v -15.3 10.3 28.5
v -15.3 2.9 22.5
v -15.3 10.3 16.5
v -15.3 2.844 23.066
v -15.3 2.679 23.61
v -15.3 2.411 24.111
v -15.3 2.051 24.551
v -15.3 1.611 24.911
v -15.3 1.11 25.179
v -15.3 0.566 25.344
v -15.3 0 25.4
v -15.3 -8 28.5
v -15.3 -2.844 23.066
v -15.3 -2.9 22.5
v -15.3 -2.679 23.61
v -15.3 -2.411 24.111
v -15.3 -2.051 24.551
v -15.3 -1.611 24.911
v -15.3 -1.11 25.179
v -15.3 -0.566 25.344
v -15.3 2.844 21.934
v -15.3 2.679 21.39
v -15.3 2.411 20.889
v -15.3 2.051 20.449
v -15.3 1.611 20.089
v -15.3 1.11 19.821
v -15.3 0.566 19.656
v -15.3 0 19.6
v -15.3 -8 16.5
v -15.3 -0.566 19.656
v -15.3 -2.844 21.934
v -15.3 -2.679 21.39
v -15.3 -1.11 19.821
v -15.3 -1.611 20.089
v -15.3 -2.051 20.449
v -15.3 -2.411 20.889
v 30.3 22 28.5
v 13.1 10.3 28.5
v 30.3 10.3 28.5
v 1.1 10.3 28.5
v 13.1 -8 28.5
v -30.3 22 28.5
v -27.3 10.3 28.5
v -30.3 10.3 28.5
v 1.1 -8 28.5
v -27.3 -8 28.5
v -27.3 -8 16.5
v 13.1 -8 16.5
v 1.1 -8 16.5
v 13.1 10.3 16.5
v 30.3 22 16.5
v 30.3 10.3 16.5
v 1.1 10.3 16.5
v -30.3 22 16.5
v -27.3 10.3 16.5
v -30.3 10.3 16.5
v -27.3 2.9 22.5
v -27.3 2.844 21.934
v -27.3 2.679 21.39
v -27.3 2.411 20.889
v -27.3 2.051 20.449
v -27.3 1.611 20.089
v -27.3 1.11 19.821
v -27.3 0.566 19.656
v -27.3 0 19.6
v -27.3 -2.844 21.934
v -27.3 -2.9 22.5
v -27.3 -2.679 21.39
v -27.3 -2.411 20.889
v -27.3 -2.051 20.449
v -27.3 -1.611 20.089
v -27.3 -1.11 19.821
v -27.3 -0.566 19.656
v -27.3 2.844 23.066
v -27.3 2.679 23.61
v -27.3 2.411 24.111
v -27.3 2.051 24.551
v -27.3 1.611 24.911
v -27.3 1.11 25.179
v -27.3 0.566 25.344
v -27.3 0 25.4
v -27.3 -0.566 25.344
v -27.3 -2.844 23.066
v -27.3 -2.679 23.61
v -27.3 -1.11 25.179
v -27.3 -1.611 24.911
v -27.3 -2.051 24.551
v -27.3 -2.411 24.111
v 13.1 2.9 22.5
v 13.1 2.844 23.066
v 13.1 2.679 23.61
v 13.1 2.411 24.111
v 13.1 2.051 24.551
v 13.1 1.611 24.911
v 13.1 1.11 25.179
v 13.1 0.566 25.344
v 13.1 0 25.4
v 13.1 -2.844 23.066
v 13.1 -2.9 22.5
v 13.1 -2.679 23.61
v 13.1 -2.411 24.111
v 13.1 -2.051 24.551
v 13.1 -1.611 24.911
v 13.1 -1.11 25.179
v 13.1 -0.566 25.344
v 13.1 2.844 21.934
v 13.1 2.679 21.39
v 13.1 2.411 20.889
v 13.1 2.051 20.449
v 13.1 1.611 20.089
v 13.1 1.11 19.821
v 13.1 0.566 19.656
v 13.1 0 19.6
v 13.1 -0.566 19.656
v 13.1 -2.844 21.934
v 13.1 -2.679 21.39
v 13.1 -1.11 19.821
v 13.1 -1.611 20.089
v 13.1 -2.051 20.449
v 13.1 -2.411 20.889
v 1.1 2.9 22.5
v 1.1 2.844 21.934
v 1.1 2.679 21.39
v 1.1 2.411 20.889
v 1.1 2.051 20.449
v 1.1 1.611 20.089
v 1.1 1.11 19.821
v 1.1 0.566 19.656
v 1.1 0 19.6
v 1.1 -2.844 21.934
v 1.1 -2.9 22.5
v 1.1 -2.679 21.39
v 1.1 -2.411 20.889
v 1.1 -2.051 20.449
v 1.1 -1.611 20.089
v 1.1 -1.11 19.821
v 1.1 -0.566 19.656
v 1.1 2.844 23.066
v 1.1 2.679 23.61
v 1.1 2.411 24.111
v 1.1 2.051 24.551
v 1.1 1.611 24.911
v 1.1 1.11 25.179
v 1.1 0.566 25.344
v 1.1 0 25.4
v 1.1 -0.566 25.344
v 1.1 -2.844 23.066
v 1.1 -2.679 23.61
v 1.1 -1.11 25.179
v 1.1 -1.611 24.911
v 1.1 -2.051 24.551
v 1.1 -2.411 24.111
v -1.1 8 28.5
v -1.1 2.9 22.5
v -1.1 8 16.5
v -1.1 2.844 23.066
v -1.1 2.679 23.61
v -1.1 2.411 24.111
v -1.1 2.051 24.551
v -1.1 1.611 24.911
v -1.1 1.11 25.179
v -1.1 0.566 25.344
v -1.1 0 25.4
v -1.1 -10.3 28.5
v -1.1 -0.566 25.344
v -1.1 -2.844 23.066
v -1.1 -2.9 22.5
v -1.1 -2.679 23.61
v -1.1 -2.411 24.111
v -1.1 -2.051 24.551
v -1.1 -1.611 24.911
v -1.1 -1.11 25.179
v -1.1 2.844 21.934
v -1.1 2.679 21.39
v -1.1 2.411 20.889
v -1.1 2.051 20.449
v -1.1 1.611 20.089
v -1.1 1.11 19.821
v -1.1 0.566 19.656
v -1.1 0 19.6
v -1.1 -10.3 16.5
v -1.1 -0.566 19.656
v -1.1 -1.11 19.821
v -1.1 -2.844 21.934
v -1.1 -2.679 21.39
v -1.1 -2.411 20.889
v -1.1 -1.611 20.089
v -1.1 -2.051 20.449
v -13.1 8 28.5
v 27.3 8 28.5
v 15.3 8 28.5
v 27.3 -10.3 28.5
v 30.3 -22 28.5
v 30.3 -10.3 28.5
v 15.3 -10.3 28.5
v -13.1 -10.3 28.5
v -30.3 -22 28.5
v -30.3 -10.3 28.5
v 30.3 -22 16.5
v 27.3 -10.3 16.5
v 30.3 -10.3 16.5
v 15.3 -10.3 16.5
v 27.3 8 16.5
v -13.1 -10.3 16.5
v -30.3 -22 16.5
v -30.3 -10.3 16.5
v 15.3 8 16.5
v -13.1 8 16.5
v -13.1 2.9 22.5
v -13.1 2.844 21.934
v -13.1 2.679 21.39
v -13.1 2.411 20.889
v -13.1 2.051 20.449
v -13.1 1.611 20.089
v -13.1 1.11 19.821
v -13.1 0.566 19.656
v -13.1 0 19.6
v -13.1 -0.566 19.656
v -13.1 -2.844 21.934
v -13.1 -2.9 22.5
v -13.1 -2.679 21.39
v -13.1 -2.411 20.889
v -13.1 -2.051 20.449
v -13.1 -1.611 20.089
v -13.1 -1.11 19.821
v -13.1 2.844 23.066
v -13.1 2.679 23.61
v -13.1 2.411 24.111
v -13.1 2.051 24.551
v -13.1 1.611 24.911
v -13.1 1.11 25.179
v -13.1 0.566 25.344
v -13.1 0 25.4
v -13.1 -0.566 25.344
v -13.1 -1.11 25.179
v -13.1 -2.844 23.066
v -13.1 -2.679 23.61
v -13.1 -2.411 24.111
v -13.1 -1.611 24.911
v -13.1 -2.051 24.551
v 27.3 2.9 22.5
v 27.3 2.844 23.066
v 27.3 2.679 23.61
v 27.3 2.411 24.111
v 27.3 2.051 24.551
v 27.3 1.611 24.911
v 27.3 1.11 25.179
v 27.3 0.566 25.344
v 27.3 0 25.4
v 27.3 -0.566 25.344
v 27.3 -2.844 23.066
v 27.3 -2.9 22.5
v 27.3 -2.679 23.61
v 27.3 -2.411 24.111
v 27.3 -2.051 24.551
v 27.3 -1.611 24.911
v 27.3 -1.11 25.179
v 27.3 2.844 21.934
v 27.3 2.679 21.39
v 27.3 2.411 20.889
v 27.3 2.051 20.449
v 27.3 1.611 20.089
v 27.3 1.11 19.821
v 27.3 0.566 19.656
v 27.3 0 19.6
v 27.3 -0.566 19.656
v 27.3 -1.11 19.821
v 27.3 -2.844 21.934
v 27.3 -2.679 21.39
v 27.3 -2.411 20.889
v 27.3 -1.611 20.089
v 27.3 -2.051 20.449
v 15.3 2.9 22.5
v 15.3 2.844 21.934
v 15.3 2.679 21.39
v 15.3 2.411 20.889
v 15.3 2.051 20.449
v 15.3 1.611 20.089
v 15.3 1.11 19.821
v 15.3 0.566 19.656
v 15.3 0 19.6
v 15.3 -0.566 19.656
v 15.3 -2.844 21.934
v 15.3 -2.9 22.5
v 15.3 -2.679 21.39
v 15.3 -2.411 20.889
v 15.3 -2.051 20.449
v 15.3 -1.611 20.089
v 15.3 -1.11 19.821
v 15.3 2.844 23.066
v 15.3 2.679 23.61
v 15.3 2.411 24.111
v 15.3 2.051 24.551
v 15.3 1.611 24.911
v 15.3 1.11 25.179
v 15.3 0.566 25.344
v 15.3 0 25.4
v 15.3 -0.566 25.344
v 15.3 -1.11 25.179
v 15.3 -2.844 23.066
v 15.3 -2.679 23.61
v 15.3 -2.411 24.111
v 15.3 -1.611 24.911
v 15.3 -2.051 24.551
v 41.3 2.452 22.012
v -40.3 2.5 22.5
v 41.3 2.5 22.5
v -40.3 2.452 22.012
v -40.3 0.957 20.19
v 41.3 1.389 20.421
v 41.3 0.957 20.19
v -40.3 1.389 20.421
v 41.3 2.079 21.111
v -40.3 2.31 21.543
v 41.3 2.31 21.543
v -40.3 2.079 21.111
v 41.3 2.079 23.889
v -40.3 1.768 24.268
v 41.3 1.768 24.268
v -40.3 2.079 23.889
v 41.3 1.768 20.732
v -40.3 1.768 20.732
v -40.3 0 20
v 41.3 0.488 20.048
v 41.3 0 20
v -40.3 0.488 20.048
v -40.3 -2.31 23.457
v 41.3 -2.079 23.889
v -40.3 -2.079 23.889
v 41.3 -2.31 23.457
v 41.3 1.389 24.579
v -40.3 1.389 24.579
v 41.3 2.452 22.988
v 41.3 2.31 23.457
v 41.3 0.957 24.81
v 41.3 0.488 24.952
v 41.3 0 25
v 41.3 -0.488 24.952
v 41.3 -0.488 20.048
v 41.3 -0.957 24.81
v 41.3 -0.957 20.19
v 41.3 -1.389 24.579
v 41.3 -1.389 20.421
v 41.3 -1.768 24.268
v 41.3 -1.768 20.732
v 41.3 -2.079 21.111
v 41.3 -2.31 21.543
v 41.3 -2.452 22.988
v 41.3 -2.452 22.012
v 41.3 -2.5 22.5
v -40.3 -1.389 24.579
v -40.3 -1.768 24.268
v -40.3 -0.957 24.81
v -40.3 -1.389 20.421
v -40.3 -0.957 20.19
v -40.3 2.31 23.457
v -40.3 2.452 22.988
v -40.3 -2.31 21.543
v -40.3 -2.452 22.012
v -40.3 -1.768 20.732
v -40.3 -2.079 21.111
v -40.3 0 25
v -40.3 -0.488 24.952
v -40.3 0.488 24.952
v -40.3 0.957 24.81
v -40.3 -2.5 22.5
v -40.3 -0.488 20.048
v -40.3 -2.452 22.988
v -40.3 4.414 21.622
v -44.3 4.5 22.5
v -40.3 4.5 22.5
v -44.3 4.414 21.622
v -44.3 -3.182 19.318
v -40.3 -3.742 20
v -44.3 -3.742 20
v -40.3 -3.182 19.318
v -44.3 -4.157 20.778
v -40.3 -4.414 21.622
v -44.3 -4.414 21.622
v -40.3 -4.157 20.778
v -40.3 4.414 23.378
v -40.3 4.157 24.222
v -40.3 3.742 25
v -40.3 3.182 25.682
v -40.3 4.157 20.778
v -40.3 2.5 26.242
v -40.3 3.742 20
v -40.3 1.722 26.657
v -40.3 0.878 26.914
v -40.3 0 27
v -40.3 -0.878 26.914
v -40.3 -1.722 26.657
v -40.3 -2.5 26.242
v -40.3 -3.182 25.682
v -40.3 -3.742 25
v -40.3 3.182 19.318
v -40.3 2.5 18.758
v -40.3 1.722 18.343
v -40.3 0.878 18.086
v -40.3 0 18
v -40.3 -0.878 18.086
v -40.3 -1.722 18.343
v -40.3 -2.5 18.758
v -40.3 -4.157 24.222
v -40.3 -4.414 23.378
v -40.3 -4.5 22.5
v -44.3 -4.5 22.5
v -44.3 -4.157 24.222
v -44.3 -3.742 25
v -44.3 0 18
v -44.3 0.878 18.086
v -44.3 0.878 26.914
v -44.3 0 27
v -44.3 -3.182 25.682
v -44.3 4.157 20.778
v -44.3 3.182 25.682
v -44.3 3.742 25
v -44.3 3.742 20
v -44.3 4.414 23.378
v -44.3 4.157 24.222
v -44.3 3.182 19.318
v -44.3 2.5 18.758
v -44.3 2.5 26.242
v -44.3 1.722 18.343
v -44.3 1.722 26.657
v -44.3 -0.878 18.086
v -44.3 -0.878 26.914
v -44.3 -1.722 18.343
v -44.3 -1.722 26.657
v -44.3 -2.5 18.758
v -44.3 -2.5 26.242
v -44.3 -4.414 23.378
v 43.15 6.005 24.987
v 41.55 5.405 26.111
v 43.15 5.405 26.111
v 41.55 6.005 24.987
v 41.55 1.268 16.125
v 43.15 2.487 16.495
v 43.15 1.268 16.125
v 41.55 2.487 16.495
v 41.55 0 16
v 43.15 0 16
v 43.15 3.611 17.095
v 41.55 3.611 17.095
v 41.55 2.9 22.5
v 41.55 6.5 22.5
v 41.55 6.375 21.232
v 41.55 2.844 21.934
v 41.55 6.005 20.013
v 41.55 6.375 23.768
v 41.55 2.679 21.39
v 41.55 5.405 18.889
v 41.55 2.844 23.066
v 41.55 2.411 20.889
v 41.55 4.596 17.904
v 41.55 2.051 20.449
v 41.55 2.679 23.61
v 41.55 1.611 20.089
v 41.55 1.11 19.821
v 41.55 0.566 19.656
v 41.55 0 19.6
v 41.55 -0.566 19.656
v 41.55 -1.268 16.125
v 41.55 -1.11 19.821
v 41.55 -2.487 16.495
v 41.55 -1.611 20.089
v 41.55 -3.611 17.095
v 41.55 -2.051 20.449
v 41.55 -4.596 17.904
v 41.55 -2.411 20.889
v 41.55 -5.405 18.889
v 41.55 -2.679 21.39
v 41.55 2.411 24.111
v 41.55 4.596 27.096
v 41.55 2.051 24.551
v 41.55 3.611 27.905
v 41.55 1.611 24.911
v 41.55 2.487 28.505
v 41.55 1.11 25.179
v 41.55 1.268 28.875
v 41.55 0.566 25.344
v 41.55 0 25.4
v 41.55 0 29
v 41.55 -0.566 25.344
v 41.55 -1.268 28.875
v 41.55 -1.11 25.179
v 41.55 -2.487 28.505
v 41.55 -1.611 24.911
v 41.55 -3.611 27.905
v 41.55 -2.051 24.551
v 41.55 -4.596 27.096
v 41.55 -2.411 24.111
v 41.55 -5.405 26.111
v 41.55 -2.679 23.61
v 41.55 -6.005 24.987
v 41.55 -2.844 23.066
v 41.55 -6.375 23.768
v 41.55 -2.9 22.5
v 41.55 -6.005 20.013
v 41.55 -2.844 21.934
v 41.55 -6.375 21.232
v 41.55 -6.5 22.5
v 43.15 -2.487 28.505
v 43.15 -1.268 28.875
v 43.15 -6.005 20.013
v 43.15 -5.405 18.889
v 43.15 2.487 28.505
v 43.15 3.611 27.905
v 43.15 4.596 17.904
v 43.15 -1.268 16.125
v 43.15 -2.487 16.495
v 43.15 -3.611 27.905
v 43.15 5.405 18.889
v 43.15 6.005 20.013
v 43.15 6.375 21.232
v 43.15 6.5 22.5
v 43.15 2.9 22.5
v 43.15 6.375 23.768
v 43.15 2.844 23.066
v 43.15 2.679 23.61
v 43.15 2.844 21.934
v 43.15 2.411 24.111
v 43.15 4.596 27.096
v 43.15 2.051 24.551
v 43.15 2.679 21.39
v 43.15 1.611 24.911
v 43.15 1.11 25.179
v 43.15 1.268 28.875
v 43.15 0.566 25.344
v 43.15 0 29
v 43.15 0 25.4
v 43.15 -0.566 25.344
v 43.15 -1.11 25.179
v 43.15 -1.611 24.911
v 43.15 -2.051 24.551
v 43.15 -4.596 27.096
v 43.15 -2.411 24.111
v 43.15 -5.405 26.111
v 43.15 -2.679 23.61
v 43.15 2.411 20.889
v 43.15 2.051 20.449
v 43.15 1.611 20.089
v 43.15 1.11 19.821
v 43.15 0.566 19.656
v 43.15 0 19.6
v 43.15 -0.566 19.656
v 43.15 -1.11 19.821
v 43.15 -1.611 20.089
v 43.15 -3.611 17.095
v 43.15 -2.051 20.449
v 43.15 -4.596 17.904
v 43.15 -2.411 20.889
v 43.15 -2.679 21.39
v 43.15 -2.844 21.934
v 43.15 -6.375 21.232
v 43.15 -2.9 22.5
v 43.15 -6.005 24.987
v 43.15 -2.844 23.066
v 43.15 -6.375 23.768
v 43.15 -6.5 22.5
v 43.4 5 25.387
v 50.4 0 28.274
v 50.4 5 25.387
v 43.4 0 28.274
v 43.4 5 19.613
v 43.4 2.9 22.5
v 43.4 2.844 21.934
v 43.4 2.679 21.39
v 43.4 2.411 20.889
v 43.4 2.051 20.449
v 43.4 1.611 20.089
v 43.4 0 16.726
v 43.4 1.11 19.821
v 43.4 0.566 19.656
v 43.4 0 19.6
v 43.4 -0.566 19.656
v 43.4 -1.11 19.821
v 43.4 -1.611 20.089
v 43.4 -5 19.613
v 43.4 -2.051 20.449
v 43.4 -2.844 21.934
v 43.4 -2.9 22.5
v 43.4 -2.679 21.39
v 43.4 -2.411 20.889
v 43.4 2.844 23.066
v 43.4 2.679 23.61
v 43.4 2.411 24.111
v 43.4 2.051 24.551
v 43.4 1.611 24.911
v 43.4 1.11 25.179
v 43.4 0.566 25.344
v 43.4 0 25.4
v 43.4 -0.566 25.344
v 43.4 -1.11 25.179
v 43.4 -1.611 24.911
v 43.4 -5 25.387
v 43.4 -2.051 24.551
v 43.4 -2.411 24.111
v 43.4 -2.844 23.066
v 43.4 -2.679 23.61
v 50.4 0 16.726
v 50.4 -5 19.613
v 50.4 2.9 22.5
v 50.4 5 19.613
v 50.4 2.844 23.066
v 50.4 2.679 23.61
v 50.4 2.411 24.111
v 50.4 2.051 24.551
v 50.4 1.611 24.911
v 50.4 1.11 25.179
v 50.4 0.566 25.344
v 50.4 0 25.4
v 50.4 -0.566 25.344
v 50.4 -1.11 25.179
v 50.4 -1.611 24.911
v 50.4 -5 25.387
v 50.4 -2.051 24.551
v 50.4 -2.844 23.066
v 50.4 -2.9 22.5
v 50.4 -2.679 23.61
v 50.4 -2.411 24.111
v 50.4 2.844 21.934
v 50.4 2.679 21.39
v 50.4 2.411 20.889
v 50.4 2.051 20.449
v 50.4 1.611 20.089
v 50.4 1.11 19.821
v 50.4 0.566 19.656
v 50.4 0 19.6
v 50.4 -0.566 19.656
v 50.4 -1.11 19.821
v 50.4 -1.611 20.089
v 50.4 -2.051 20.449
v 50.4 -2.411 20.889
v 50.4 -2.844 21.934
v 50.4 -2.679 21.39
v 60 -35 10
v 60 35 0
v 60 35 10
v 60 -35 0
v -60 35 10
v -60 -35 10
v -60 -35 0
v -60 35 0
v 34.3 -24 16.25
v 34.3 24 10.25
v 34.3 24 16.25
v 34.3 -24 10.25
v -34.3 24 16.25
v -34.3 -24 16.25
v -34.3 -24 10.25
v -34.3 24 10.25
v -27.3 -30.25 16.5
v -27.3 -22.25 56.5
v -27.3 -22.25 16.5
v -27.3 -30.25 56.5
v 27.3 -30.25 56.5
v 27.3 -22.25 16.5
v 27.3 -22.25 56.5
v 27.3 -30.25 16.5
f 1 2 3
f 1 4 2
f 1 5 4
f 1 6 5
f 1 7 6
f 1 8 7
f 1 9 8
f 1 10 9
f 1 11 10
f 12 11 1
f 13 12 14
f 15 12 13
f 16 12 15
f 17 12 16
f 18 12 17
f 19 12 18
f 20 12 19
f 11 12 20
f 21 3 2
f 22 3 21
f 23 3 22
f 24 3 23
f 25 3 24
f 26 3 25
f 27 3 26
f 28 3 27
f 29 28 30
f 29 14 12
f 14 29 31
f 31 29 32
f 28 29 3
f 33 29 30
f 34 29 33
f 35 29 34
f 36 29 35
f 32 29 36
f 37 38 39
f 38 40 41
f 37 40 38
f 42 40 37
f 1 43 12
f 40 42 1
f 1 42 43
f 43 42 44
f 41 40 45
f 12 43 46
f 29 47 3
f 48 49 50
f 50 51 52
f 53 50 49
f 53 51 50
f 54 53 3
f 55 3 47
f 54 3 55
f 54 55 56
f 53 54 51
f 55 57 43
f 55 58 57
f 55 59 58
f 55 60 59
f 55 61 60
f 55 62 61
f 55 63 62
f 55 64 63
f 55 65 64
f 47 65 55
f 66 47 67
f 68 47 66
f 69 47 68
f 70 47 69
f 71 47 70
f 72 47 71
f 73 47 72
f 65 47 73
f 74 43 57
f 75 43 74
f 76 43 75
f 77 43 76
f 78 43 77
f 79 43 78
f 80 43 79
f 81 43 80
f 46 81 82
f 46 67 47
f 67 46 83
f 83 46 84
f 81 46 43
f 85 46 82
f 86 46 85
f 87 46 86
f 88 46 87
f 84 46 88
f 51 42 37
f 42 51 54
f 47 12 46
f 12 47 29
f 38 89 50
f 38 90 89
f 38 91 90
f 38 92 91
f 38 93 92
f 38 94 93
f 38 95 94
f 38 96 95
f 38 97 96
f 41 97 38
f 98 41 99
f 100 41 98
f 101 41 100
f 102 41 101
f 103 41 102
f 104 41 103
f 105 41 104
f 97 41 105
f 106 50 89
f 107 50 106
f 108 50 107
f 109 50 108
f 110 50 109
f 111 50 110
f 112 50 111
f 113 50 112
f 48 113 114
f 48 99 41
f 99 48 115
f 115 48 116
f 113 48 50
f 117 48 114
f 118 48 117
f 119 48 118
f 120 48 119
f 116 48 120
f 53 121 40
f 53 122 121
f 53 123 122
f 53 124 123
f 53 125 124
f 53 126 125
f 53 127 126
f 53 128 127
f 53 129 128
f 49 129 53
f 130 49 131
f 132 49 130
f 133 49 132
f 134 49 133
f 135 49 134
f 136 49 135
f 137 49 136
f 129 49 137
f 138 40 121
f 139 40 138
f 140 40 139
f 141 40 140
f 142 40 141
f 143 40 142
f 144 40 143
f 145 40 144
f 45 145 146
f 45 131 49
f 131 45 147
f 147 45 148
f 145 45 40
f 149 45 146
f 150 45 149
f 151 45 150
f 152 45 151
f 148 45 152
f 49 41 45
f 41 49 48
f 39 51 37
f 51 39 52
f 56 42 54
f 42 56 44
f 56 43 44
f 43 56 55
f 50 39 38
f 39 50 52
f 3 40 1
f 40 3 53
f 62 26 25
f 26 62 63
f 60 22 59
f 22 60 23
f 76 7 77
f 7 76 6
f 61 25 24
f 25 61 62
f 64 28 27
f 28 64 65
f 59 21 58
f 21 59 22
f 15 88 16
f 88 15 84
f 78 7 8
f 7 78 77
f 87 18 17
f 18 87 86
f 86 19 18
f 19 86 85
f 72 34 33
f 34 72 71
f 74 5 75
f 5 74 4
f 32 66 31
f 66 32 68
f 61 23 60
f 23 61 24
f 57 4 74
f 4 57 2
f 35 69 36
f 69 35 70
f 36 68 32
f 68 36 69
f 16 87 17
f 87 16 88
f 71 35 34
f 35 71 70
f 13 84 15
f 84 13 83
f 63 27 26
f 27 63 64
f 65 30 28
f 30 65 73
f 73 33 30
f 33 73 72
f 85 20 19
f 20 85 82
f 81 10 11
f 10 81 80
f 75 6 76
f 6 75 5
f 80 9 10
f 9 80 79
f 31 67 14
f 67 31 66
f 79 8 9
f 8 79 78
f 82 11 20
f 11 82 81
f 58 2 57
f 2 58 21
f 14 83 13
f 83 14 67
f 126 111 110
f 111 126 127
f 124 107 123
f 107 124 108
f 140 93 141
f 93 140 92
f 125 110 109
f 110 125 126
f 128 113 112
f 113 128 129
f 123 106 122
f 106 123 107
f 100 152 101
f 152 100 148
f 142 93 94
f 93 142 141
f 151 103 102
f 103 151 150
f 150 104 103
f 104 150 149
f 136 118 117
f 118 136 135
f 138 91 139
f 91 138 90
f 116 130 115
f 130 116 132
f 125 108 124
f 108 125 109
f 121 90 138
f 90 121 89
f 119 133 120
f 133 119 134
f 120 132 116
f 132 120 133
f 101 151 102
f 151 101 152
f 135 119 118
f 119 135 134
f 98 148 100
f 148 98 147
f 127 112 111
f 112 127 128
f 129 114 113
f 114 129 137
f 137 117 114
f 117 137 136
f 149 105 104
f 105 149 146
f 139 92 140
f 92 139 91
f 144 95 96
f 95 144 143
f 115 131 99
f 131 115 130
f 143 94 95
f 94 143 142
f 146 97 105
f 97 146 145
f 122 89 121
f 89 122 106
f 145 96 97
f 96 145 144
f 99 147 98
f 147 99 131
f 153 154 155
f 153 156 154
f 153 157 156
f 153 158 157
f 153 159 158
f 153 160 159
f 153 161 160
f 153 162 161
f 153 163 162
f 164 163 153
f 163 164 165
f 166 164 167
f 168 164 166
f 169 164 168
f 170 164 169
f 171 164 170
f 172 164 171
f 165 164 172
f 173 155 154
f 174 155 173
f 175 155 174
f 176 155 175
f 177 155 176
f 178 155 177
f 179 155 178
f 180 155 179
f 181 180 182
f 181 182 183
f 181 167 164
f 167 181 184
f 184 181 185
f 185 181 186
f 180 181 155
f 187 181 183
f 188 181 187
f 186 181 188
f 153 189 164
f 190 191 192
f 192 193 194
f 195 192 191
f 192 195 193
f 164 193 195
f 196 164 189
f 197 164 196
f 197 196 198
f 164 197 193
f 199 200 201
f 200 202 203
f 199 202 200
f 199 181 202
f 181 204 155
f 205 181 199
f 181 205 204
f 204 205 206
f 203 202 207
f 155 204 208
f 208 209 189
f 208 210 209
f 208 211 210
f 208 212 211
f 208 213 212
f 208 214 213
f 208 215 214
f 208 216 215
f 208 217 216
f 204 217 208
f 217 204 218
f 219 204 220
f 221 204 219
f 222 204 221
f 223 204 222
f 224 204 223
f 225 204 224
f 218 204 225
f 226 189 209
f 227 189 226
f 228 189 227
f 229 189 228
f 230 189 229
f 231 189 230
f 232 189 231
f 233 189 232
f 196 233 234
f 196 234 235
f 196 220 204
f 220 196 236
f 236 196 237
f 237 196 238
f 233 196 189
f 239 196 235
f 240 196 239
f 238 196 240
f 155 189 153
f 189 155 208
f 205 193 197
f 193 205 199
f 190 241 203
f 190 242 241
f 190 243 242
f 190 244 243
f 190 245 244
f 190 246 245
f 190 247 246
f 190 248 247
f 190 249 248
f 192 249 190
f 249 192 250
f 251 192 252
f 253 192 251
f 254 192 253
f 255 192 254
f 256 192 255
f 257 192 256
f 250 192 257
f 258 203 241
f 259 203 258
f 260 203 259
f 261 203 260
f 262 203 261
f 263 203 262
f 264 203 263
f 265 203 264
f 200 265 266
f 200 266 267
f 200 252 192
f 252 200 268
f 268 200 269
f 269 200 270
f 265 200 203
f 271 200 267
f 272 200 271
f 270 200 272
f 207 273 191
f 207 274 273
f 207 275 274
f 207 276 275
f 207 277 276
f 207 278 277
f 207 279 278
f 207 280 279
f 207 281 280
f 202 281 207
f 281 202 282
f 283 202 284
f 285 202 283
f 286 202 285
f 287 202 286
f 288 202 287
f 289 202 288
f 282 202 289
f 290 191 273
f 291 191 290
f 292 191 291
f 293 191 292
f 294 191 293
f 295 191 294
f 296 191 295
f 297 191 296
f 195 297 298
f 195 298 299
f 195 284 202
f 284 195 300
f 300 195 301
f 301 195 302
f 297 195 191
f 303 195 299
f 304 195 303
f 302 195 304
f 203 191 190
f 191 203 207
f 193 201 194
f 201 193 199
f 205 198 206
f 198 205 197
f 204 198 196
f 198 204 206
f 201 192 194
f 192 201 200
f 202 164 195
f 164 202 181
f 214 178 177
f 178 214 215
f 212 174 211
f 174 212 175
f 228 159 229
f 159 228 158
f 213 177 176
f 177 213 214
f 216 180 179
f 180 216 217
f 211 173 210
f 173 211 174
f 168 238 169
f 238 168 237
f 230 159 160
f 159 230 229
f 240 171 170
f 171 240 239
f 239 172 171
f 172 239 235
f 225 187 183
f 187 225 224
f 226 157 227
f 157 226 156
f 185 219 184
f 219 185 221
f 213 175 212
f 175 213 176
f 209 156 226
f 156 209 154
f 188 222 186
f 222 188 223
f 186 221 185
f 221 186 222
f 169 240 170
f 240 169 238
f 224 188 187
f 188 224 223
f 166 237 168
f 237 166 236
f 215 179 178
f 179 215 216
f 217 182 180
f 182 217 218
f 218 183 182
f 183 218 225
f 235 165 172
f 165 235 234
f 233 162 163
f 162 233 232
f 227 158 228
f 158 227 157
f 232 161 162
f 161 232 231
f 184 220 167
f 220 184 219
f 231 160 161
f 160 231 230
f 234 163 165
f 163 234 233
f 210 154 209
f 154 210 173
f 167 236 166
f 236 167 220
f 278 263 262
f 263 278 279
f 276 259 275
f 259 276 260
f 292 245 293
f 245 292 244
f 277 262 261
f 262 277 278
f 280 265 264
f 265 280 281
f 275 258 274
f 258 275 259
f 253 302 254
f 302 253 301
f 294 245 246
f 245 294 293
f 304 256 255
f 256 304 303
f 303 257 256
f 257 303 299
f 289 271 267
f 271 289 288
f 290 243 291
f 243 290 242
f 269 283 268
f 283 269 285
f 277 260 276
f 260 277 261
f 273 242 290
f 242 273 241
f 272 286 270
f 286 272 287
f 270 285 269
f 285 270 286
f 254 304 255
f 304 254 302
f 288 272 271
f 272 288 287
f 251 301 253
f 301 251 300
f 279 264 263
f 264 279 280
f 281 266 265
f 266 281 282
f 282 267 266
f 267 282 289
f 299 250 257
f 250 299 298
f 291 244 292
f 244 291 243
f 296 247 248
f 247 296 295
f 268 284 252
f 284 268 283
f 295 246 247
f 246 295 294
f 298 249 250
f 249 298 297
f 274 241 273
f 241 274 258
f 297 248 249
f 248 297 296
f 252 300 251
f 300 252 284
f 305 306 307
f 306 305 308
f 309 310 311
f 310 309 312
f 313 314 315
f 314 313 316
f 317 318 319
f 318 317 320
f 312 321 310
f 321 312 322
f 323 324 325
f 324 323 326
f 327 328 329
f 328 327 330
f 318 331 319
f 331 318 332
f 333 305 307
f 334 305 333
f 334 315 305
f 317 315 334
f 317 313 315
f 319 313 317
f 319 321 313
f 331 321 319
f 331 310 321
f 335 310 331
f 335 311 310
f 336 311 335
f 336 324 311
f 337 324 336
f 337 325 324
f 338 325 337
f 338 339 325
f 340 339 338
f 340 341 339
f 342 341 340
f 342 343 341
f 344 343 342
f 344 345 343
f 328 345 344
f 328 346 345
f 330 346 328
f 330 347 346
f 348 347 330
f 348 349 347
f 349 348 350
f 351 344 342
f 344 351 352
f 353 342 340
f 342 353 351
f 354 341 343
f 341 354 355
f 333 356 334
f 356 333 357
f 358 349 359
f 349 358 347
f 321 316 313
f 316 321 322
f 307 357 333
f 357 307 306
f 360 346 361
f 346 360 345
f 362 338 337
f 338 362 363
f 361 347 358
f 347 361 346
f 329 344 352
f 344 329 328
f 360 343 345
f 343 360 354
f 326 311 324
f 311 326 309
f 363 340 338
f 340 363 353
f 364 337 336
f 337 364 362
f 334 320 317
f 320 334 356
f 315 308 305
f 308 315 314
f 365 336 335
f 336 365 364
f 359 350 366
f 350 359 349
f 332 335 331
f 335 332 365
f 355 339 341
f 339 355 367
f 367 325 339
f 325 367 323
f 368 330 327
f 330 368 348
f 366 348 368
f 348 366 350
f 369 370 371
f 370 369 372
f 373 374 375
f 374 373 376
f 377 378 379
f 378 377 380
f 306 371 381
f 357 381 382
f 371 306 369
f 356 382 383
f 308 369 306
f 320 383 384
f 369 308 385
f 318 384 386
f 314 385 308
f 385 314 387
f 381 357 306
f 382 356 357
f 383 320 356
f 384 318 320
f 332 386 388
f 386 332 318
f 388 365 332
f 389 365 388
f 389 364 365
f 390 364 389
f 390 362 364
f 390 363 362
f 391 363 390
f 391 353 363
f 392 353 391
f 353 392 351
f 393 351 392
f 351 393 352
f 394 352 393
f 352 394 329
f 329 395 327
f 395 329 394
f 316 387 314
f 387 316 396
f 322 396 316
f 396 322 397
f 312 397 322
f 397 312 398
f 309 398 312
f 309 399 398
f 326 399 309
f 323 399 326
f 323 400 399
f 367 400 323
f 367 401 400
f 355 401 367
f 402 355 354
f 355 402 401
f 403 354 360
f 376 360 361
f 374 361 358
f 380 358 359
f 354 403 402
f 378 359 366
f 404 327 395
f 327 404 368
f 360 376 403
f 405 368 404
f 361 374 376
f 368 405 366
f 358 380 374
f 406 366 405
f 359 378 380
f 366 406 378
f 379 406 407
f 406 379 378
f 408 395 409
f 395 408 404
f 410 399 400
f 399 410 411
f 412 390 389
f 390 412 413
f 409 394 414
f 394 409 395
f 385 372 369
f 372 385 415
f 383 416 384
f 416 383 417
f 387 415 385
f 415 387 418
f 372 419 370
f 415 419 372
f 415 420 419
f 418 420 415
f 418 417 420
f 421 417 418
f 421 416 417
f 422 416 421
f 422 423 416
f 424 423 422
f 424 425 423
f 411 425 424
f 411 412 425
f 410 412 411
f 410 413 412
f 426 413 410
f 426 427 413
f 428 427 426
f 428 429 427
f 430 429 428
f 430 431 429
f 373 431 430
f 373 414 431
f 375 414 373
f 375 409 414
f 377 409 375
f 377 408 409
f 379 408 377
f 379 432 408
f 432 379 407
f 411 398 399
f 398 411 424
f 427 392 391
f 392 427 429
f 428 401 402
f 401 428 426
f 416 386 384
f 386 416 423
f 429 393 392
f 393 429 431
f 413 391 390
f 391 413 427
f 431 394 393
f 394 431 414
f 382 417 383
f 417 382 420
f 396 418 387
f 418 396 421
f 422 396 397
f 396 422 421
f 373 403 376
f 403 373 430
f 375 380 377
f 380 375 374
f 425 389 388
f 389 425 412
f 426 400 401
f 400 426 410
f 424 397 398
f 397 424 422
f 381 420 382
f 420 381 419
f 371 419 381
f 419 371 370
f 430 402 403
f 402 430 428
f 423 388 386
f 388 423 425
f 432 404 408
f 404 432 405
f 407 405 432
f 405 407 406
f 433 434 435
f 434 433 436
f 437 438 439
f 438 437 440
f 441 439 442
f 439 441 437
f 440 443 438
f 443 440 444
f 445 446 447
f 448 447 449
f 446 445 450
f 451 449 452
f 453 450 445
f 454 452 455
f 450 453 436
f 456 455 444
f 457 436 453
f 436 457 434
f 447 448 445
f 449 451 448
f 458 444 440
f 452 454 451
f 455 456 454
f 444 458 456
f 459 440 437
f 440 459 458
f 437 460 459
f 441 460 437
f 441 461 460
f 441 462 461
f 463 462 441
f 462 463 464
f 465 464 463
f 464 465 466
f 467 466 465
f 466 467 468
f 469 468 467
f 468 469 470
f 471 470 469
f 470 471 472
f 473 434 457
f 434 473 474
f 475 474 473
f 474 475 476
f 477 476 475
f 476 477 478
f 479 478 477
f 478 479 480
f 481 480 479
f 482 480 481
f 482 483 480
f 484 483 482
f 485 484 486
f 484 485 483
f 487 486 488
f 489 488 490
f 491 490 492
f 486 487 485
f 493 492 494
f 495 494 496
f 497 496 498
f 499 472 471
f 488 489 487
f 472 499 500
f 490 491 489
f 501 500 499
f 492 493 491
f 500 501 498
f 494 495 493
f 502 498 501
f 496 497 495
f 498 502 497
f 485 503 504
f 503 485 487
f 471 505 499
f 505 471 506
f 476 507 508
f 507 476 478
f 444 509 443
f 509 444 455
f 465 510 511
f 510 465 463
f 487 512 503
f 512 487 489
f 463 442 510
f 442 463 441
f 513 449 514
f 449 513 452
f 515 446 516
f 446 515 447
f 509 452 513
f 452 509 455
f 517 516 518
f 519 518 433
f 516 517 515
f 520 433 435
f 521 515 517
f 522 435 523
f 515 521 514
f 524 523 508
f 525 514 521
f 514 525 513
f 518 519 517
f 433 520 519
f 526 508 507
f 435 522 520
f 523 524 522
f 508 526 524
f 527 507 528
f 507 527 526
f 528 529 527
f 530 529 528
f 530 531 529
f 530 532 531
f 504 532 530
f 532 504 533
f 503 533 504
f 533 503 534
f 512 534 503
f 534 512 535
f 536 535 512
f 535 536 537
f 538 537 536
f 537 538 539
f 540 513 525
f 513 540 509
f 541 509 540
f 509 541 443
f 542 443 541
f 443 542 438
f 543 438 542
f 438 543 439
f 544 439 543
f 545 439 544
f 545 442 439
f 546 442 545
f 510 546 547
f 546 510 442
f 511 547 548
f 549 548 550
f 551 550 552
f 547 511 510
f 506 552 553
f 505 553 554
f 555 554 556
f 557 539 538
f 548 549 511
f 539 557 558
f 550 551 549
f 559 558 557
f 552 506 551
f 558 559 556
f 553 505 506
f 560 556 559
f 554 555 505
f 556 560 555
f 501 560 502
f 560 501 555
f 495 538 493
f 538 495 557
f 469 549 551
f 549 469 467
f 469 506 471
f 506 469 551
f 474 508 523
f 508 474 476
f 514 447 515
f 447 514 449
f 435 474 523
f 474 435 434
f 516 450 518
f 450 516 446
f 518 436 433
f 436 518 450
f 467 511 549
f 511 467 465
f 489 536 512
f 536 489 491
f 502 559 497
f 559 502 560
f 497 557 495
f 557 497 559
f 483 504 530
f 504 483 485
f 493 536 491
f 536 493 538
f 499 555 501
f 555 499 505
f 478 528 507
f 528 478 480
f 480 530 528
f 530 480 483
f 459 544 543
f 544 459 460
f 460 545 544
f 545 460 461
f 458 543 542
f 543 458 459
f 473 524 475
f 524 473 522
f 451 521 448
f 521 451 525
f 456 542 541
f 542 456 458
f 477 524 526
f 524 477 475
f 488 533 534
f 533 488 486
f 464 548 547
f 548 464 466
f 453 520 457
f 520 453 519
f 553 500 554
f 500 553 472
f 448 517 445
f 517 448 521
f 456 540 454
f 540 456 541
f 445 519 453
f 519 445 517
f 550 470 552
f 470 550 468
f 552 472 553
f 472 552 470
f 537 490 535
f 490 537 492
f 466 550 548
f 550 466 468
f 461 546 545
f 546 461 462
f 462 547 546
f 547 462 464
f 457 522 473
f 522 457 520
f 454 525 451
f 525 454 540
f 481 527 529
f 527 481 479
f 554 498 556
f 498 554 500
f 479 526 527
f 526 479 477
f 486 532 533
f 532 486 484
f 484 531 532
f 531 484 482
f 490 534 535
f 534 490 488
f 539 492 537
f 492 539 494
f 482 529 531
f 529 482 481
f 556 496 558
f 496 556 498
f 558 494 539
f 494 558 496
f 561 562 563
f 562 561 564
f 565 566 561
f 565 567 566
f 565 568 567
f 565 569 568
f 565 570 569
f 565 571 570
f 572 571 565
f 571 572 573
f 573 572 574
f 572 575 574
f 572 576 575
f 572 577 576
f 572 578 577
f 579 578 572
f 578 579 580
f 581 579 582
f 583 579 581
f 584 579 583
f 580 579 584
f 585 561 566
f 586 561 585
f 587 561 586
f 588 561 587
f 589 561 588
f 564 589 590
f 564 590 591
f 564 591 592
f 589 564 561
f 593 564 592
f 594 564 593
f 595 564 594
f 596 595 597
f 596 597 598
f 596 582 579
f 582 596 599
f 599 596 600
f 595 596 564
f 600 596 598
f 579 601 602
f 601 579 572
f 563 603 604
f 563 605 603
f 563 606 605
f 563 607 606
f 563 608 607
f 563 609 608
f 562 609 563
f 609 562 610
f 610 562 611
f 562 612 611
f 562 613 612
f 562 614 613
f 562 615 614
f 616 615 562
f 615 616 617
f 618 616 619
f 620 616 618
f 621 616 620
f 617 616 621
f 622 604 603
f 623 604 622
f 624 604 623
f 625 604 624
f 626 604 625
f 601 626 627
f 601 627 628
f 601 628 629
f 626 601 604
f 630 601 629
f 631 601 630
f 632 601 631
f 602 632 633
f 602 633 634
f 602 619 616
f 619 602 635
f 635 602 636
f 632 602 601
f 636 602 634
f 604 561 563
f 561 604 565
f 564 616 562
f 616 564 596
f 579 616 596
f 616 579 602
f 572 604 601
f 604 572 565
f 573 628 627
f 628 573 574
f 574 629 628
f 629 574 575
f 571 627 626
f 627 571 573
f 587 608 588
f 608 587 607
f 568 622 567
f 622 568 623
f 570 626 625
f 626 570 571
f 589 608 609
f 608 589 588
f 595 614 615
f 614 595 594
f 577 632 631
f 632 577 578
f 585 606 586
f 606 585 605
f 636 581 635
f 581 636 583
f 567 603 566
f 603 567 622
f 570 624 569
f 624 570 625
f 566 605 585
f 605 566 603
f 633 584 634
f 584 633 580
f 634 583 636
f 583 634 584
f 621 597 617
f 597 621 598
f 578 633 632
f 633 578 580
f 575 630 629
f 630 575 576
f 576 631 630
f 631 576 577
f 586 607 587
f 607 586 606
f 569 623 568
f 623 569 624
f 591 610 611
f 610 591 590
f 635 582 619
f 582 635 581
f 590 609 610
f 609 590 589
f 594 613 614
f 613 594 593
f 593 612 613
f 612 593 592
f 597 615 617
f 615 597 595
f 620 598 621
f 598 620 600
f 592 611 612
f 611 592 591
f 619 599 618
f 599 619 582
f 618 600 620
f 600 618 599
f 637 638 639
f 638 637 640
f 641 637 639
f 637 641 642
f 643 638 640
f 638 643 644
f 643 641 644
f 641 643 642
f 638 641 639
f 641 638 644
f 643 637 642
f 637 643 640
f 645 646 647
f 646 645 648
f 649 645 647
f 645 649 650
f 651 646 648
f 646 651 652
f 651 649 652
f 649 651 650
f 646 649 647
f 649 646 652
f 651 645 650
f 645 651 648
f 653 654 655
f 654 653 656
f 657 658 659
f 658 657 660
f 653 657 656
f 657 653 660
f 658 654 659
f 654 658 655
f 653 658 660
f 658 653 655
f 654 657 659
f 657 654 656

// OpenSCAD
$fn = 32;

// ------------------------------------------------------------------------
// Comb hinge with flap: leaf 60.6 x 22 mm, pin d5, flap 40 mm
// Every part is its own module, assembly() places every instance.
// ------------------------------------------------------------------------

// --- part 1 ---
module hinge_bed() {
  difference() {
    translate([-60, -35, 0]) cube([120, 70, 10]);
  }
}

// --- part 2 ---
module hinge_riser() {
  difference() {
    translate([-34.3, -24, 0]) cube([68.6, 48, 6]);
  }
}

// --- part 3 ---
module hinge_leaf_a() {
  difference() {
    union() {
      translate([-27.3, -8, -6]) cube([12, 30, 12]);
      translate([1.1, -8, -6]) cube([12, 30, 12]);
      translate([-30.3, 10.3, -6]) cube([60.6, 11.7, 12]);
    }
    translate([-21.3, 0, 0]) rotate([0, 90, 0]) cylinder(h = 14, d = 5.8, center = true);
    translate([7.1, 0, 0]) rotate([0, 90, 0]) cylinder(h = 14, d = 5.8, center = true);
  }
}

// --- part 4 ---
module hinge_leaf_b() {
  difference() {
    union() {
      translate([-13.1, -22, -6]) cube([12, 30, 12]);
      translate([15.3, -22, -6]) cube([12, 30, 12]);
      translate([-30.3, -22, -6]) cube([60.6, 11.7, 12]);
    }
    translate([-7.1, 0, 0]) rotate([0, 90, 0]) cylinder(h = 14, d = 5.8, center = true);
    translate([21.3, 0, 0]) rotate([0, 90, 0]) cylinder(h = 14, d = 5.8, center = true);
  }
}

// --- part 5 ---
module hinge_flap() {
  difference() {
    translate([-27.3, -20, 0]) cube([54.6, 40, 8]);
  }
}

// --- part 6 ---
module hinge_pin() {
  rotate([0, 90, 0]) cylinder(h = 82.6, d = 5, center = true);
  translate([-44.3, 0, 0]) rotate([0, 90, 0]) cylinder(h = 4, d = 9);
}

// --- part 7 ---
module pin_washer() {
  difference() {
      translate([0, 0, 0]) cylinder(h = 1.6, d = 13);
      translate([0, 0, -1]) cylinder(h = 3.6, d = 5.8);
    }
}

// --- part 8 ---
module pin_nut() {
  difference() {
    linear_extrude(height = 7) polygon(points = [[5.774, 0], [2.887, 5], [-2.887, 5], [-5.774, 0], [-2.887, -5], [2.887, -5]]);
    translate([0, 0, -1]) cylinder(h = 9, d = 5.8);
  }
}

// --- assembly ---
module assembly() {
  color([0.80, 0.24, 0.20]) translate([0, 0, 0]) rotate([0, 0, 0]) hinge_bed();
  color([0.20, 0.45, 0.75]) translate([0, 0, 10.25]) rotate([0, 0, 0]) hinge_riser();
  color([0.25, 0.62, 0.32]) translate([0, 0, 22.5]) rotate([0, 0, 0]) hinge_leaf_a();
  color([0.92, 0.70, 0.18]) translate([0, 0, 22.5]) rotate([0, 0, 0]) hinge_leaf_b();
  color([0.58, 0.35, 0.70]) translate([0, -22.25, 36.5]) rotate([90, 0, 0]) hinge_flap();
  color([0.16, 0.66, 0.66]) translate([0, 0, 22.5]) rotate([0, 0, 0]) hinge_pin();
  color([0.85, 0.48, 0.18]) translate([41.55, 0, 22.5]) rotate([0, 90, 0]) pin_washer();
  color([0.55, 0.60, 0.65]) translate([43.4, 0, 22.5]) rotate([0, 90, 0]) pin_nut();
}

assembly();
